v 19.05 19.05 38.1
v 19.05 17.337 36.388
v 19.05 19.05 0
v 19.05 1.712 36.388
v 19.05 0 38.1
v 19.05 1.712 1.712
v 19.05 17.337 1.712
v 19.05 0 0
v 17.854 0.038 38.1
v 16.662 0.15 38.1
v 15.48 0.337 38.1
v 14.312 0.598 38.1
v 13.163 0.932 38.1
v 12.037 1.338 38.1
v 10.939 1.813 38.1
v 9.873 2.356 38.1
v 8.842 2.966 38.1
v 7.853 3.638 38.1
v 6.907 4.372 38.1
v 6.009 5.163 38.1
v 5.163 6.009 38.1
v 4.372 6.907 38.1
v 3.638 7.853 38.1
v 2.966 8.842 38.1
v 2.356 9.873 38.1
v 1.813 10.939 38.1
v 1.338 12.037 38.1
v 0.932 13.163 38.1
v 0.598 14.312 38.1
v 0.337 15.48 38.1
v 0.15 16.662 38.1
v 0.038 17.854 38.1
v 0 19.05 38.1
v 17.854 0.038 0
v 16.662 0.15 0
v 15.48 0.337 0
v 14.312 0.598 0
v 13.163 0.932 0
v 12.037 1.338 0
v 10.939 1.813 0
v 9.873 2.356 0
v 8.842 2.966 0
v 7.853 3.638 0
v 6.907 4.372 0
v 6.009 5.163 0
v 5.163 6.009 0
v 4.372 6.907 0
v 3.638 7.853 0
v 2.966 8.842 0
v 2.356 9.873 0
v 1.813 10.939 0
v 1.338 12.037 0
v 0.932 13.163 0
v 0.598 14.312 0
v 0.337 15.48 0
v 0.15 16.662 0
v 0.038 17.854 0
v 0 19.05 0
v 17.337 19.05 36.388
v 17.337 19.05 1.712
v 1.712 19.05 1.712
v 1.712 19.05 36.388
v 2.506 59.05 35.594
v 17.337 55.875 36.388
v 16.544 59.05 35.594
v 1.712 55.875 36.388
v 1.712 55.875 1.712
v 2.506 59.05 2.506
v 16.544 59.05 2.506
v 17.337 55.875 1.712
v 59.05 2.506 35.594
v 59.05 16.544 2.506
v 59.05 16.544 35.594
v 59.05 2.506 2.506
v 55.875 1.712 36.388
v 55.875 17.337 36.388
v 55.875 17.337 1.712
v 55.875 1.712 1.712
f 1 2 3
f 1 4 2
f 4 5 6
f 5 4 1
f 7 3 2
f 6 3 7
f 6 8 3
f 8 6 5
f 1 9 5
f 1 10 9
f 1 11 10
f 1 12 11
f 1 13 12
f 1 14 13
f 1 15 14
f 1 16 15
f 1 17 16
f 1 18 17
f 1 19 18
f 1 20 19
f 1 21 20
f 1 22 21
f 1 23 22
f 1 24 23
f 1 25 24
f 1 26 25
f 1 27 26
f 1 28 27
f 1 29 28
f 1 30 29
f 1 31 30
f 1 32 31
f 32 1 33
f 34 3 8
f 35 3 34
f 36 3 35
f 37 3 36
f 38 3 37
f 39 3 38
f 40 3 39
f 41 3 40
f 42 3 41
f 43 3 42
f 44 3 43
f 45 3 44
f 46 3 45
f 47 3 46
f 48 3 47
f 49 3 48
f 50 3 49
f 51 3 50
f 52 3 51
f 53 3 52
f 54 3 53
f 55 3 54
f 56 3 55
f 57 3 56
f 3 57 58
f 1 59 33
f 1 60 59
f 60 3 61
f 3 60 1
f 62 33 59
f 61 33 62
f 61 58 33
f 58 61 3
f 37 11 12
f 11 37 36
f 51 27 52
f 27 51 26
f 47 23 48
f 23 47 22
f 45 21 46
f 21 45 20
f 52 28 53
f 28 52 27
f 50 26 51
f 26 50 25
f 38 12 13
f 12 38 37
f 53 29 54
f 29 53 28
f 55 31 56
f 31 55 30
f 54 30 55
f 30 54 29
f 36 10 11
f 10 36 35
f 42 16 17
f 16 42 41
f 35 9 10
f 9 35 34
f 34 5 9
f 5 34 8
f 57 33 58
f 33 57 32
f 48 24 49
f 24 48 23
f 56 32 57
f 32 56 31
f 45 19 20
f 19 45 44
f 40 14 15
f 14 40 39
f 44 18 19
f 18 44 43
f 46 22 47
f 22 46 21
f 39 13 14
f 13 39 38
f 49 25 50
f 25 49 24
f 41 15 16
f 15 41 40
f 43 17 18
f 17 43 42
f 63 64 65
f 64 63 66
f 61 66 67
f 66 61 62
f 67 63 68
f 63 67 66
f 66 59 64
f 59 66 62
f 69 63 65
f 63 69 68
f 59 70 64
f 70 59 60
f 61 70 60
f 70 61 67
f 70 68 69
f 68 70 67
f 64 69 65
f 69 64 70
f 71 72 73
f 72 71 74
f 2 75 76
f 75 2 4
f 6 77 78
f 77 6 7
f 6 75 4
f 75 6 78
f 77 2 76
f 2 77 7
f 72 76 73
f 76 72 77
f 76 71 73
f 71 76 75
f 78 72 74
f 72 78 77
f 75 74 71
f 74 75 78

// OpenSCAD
$fn=100;

plug_looseness = 0.125;

wall_thick = 1.5875 + plug_looseness;
extrusion_height = 38.1;
extrusion_width = 19.05;
leg_length = 40;
taper_rise = 0.79375;
taper_run = 3.175;

leg_height = extrusion_height - (2 * wall_thick);
leg_width = extrusion_width - (2 * wall_thick);

taper_height = leg_height - (2 * taper_rise);
taper_width = leg_width - (2 * taper_rise);

near_zero = 0.0001;



intersection()
{
    cube([extrusion_width, extrusion_width, extrusion_height]);

    translate([extrusion_width, extrusion_width, 0])
    {
        cylinder(r=extrusion_width, h = extrusion_height);
    }
}

hull()
{
translate([wall_thick, extrusion_width - near_zero, wall_thick])
{
    cube([leg_width, leg_length - taper_run, leg_height]);
}

translate([wall_thick + taper_rise, extrusion_width + leg_length, wall_thick + taper_rise])
{
    cube([taper_width, near_zero, taper_height]);
}
}



hull()
{
translate([extrusion_width - near_zero, wall_thick, wall_thick])
{
    cube([leg_length - taper_run, leg_width, leg_height]);
}
translate([extrusion_width + leg_length, wall_thick + taper_rise, wall_thick + taper_rise])
{
    cube([near_zero, taper_width, taper_height]);
}

}
